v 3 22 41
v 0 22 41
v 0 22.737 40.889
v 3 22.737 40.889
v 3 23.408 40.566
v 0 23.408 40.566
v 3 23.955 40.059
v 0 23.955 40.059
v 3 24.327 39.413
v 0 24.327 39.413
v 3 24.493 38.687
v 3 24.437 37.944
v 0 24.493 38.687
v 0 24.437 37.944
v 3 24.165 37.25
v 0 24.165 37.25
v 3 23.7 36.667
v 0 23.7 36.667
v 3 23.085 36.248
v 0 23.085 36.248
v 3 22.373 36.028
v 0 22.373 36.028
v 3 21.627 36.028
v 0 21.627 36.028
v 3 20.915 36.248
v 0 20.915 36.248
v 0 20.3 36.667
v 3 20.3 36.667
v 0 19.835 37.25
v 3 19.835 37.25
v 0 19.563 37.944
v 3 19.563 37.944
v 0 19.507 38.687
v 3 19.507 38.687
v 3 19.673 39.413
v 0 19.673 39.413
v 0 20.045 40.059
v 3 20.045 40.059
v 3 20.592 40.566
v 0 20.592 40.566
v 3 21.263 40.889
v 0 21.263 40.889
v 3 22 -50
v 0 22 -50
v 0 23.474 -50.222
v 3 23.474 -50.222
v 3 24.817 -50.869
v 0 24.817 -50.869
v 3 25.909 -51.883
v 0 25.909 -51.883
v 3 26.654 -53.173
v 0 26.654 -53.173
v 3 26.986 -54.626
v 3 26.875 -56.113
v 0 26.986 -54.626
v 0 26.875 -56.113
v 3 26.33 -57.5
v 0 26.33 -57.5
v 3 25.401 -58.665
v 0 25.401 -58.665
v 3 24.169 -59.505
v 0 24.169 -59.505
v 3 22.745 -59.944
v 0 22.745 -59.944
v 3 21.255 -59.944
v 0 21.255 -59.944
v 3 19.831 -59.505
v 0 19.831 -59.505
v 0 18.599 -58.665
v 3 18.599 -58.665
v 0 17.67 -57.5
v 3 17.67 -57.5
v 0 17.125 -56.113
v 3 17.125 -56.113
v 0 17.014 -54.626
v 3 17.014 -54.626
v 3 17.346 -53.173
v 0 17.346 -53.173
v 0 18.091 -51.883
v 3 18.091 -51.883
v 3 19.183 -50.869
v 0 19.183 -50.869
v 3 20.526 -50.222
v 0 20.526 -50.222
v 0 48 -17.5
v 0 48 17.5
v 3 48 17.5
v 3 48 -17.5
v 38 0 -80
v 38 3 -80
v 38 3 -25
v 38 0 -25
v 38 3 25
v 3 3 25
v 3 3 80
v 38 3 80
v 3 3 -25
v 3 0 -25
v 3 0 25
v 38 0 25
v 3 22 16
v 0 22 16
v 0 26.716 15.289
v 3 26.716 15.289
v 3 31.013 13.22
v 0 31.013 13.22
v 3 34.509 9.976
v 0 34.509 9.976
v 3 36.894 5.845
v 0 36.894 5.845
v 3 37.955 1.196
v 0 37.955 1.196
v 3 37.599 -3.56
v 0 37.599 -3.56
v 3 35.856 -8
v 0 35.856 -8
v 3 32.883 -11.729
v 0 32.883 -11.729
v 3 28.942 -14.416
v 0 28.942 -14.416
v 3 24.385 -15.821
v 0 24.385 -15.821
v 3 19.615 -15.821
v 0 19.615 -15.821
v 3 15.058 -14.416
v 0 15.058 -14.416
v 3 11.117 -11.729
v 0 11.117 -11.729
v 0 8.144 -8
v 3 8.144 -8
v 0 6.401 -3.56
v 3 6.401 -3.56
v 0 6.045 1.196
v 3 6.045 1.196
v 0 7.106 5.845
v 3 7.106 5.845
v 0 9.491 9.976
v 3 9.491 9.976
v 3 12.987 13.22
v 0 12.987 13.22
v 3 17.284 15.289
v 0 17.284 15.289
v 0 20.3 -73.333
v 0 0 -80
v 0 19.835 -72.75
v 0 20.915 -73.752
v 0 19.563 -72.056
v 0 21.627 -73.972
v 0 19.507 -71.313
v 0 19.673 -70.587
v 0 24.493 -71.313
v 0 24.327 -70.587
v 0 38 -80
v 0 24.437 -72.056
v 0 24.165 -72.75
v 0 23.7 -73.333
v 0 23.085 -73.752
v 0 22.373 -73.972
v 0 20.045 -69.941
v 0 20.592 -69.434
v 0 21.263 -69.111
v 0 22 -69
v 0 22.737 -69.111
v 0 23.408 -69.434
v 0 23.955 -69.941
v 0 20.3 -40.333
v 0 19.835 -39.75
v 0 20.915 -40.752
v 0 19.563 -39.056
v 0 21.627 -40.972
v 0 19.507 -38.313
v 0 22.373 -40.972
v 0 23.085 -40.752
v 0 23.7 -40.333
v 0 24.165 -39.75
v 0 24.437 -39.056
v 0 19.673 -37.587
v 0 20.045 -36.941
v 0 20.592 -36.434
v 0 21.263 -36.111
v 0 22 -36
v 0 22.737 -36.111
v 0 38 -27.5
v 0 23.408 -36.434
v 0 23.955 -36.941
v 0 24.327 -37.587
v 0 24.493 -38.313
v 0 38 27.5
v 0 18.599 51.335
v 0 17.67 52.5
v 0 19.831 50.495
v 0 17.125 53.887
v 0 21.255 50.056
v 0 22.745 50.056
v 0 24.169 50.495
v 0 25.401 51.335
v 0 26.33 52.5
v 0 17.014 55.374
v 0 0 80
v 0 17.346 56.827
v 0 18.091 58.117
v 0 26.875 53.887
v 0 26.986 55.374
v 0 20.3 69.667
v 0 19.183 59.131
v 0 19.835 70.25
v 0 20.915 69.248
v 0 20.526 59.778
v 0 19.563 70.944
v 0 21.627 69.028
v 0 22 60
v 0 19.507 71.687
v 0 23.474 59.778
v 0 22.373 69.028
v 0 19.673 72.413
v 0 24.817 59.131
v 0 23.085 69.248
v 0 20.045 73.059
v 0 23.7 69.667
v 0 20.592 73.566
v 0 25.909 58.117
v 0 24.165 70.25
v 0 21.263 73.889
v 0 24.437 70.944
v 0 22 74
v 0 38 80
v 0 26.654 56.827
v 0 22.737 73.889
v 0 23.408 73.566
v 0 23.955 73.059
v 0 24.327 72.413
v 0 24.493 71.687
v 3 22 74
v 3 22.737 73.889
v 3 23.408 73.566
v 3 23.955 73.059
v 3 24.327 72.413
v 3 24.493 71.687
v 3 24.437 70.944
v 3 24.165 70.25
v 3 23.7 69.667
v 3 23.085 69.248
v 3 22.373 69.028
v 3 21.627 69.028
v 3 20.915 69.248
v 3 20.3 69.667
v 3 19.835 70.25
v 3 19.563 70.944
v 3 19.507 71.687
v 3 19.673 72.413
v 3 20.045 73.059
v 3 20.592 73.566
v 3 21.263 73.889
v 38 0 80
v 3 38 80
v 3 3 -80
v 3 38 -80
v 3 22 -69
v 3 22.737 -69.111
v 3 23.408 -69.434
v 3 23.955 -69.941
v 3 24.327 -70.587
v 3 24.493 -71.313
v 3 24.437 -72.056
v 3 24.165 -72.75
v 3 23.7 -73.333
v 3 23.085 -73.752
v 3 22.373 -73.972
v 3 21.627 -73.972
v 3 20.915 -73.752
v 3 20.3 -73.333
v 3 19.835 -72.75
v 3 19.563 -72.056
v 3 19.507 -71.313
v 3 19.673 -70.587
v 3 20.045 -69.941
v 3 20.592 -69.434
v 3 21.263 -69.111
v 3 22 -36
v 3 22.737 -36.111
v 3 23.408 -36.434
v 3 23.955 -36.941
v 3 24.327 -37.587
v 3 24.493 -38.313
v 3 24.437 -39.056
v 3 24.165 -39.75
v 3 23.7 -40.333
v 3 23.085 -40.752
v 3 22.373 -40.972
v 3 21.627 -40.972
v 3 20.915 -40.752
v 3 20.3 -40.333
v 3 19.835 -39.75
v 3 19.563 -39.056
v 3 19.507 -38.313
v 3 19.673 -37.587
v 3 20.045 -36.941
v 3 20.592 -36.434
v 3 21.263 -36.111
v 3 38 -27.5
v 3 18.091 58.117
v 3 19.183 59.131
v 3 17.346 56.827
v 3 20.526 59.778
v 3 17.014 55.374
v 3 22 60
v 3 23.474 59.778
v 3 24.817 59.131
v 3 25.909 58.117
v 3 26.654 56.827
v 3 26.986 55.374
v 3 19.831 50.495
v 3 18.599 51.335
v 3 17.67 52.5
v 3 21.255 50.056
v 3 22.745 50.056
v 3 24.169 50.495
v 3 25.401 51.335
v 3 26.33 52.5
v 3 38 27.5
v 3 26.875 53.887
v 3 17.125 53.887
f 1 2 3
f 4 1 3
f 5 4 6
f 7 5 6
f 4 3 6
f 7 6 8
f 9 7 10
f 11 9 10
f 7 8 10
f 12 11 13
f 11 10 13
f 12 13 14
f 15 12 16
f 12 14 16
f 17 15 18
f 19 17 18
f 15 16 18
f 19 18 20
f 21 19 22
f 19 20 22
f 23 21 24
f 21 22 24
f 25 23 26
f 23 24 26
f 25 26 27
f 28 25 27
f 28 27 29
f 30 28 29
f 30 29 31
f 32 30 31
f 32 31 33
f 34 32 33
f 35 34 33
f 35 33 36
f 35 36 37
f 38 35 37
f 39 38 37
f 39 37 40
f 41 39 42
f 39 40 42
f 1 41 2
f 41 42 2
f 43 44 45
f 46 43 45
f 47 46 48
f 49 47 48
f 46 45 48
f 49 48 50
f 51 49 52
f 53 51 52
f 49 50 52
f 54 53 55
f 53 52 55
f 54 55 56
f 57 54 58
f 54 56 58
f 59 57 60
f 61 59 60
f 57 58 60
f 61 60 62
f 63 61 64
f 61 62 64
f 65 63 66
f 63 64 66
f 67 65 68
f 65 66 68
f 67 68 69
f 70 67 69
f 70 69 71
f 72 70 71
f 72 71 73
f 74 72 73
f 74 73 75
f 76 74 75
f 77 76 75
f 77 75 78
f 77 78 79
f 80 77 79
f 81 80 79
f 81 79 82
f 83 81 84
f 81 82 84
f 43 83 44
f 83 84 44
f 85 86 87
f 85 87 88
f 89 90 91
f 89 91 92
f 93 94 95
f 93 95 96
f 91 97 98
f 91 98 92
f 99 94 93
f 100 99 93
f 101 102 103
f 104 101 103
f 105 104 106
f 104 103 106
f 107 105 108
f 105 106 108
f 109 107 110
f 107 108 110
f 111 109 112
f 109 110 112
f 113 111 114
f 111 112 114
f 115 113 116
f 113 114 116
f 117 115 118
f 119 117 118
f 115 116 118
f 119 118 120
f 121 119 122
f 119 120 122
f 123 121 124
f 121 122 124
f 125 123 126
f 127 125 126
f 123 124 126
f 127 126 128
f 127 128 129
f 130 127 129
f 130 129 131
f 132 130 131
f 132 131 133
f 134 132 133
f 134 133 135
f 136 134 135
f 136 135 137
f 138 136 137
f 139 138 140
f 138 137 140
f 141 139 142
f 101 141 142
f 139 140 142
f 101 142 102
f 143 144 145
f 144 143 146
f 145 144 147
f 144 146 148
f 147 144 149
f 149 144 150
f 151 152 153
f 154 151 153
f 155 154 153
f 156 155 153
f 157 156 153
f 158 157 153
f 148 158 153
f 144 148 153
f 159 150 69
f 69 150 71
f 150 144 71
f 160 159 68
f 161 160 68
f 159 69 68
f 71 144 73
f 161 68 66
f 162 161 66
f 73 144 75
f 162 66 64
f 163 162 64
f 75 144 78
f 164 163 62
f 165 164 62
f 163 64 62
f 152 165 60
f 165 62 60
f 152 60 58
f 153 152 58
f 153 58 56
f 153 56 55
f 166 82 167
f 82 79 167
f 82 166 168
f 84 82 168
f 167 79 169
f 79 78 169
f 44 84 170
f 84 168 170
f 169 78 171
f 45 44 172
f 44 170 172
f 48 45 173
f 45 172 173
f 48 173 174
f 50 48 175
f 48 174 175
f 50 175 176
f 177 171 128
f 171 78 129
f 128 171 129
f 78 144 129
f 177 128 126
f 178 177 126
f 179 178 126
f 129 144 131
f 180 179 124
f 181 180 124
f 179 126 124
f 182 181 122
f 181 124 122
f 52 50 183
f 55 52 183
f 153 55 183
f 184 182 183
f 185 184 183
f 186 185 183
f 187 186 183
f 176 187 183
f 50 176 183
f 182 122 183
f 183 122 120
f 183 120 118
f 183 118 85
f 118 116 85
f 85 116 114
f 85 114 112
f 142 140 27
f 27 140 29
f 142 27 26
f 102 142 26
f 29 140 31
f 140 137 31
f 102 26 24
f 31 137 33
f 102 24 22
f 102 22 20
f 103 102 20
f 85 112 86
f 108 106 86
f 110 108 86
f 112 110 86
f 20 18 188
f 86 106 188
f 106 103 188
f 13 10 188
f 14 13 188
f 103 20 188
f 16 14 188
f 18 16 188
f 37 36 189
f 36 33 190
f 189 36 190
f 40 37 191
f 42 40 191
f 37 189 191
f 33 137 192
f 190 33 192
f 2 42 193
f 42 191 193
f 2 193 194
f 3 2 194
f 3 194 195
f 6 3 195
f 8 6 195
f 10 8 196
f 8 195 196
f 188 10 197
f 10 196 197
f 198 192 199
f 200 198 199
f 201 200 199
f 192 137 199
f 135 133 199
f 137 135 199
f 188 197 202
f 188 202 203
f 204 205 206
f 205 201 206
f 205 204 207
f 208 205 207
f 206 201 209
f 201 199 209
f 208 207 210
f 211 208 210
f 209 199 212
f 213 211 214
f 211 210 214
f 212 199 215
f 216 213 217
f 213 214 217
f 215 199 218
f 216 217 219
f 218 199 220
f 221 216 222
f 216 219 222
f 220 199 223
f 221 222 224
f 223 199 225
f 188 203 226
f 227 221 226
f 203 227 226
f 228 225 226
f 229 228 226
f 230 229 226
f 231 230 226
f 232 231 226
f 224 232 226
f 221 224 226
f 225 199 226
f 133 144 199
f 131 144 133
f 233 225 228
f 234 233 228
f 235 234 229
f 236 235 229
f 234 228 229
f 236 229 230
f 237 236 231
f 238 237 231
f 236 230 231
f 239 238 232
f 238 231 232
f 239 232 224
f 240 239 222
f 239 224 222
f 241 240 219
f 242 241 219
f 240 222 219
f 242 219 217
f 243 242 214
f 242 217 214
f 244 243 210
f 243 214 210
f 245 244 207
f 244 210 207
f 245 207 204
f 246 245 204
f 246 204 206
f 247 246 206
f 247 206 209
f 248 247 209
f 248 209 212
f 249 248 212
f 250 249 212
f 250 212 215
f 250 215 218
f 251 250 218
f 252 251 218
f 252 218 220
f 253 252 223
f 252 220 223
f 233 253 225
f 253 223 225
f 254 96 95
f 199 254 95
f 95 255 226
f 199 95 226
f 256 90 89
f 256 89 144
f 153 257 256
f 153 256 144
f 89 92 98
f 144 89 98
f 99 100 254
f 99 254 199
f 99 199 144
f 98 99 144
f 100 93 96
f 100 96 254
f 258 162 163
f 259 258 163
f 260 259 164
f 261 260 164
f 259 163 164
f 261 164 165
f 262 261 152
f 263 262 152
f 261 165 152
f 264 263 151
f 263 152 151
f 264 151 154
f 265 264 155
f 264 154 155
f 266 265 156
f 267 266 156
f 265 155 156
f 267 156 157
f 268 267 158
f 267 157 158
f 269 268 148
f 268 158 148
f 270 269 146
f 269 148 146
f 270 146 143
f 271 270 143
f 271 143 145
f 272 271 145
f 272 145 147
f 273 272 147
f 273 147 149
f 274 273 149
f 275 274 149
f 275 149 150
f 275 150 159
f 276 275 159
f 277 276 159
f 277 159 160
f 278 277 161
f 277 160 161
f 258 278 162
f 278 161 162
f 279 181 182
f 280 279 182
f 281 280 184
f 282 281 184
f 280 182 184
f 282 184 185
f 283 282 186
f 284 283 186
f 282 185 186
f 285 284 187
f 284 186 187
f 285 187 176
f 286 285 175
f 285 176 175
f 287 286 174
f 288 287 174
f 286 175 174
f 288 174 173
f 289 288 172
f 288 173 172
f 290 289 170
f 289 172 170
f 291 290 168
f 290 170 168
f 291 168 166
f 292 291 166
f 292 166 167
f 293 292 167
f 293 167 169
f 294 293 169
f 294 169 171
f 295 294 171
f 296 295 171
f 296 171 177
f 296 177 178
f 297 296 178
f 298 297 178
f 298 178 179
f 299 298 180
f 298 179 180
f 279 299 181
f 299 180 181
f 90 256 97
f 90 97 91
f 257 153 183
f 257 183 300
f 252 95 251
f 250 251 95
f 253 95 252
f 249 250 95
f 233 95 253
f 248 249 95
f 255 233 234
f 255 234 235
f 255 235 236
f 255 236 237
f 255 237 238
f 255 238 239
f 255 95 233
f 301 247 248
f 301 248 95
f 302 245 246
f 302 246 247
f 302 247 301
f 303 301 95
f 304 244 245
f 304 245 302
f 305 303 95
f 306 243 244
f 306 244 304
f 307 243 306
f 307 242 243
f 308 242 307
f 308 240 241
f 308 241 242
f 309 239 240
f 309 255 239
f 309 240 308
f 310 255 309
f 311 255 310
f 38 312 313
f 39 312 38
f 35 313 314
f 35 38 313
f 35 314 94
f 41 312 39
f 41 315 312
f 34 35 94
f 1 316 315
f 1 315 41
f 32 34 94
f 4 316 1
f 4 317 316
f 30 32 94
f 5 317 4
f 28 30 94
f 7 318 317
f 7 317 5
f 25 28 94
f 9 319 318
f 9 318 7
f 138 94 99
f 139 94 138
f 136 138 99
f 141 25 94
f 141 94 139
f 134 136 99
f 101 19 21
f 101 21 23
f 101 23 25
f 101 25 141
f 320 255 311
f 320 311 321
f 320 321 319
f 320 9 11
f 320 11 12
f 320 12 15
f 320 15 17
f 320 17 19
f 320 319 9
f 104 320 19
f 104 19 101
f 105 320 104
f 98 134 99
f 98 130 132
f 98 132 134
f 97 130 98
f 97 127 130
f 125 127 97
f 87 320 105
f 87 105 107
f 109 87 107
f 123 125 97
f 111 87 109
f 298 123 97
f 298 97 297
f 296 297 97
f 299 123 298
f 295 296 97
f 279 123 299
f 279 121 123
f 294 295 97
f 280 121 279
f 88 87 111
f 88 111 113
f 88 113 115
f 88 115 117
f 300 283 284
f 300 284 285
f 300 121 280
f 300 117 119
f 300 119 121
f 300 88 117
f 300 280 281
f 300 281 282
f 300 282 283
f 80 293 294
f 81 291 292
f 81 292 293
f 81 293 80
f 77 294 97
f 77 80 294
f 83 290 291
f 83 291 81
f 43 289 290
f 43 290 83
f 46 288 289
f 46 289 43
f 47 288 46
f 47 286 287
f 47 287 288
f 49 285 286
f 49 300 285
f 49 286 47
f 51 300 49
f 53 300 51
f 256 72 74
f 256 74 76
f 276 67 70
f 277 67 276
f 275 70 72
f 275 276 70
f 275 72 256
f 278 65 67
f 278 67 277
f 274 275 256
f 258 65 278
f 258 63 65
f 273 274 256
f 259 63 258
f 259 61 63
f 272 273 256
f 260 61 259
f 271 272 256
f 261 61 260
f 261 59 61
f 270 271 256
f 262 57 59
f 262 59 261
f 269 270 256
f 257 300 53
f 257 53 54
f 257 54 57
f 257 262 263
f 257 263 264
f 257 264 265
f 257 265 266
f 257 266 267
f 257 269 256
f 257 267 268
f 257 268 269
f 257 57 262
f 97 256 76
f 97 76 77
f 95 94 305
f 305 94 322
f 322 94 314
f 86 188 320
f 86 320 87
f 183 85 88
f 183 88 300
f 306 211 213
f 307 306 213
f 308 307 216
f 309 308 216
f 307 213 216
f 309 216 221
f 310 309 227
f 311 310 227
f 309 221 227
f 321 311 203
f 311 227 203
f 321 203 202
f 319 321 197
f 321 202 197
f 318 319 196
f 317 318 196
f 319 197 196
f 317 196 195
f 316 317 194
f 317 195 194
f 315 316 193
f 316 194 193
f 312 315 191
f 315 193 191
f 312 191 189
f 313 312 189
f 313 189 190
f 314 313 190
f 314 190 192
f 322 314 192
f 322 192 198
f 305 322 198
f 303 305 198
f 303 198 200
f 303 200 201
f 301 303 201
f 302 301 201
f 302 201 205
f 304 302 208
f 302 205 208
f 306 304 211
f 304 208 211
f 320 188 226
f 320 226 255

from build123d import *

# Parameters (mm, degrees)
SALIENTE_EXTRUIR1_DEPTH      = 80
SALIENTE_EXTRUIR1_DEPTH_BACK = 80
CROQUIS2_W                   = 35
CROQUIS2_H                   = 50
CORTAR_EXTRUIR1_DEPTH        = 3
CROQUIS3_R                   = 2.5
CROQUIS3_R_2                 = 5
CORTAR_EXTRUIR2_DEPTH        = 3
SALIENTE_EXTRUIR2_DEPTH      = 3
CROQUIS5_R                   = 16
CORTAR_EXTRUIR3_DEPTH        = 3


with BuildPart() as part:
    # Croquis1 → Saliente-Extruir1 (new body, two sides)
    with BuildSketch(Plane.XY) as saliente_extruir1_sk:
        Polygon((0, 0), (0, 38), (3, 38), (3, 3), (38, 3), (38, 0), align=None)
    extrude(amount=SALIENTE_EXTRUIR1_DEPTH)
    extrude(saliente_extruir1_sk.sketch, amount=-SALIENTE_EXTRUIR1_DEPTH_BACK)

    # Croquis2 → Cortar-Extruir1 (cut)
    with BuildSketch(Plane(origin=(0, 3, 0), x_dir=(1, 0, 0), z_dir=(0, 1, 0))):
        with Locations((20.5, 0)):
            Rectangle(CROQUIS2_W, CROQUIS2_H)
    extrude(amount=-CORTAR_EXTRUIR1_DEPTH, mode=Mode.SUBTRACT)

    # Croquis3 → Cortar-Extruir2 (cut)
    with BuildSketch(Plane.ZY):
        with Locations((71.5, 22)):
            Circle(CROQUIS3_R)
        with Locations((55, 22)):
            Circle(CROQUIS3_R_2)
        with Locations((38.5, 22)):
            Circle(CROQUIS3_R)
        with Locations((-38.5, 22)):
            Circle(CROQUIS3_R)
        with Locations((-55, 22)):
            Circle(CROQUIS3_R_2)
        with Locations((-71.5, 22)):
            Circle(CROQUIS3_R)
    extrude(amount=-CORTAR_EXTRUIR2_DEPTH, mode=Mode.SUBTRACT)

    # Croquis4 → Saliente-Extruir2 (add)
    with BuildSketch(Plane.ZY):
        Polygon((27.5, 38), (17.5, 48), (-17.5, 48), (-27.5, 38), align=None)
    extrude(amount=-SALIENTE_EXTRUIR2_DEPTH)

    # Croquis5 → Cortar-Extruir3 (cut)
    with BuildSketch(Plane.ZY):
        with Locations((0, 22)):
            Circle(CROQUIS5_R)
    extrude(amount=-CORTAR_EXTRUIR3_DEPTH, mode=Mode.SUBTRACT)


solid = part.part
